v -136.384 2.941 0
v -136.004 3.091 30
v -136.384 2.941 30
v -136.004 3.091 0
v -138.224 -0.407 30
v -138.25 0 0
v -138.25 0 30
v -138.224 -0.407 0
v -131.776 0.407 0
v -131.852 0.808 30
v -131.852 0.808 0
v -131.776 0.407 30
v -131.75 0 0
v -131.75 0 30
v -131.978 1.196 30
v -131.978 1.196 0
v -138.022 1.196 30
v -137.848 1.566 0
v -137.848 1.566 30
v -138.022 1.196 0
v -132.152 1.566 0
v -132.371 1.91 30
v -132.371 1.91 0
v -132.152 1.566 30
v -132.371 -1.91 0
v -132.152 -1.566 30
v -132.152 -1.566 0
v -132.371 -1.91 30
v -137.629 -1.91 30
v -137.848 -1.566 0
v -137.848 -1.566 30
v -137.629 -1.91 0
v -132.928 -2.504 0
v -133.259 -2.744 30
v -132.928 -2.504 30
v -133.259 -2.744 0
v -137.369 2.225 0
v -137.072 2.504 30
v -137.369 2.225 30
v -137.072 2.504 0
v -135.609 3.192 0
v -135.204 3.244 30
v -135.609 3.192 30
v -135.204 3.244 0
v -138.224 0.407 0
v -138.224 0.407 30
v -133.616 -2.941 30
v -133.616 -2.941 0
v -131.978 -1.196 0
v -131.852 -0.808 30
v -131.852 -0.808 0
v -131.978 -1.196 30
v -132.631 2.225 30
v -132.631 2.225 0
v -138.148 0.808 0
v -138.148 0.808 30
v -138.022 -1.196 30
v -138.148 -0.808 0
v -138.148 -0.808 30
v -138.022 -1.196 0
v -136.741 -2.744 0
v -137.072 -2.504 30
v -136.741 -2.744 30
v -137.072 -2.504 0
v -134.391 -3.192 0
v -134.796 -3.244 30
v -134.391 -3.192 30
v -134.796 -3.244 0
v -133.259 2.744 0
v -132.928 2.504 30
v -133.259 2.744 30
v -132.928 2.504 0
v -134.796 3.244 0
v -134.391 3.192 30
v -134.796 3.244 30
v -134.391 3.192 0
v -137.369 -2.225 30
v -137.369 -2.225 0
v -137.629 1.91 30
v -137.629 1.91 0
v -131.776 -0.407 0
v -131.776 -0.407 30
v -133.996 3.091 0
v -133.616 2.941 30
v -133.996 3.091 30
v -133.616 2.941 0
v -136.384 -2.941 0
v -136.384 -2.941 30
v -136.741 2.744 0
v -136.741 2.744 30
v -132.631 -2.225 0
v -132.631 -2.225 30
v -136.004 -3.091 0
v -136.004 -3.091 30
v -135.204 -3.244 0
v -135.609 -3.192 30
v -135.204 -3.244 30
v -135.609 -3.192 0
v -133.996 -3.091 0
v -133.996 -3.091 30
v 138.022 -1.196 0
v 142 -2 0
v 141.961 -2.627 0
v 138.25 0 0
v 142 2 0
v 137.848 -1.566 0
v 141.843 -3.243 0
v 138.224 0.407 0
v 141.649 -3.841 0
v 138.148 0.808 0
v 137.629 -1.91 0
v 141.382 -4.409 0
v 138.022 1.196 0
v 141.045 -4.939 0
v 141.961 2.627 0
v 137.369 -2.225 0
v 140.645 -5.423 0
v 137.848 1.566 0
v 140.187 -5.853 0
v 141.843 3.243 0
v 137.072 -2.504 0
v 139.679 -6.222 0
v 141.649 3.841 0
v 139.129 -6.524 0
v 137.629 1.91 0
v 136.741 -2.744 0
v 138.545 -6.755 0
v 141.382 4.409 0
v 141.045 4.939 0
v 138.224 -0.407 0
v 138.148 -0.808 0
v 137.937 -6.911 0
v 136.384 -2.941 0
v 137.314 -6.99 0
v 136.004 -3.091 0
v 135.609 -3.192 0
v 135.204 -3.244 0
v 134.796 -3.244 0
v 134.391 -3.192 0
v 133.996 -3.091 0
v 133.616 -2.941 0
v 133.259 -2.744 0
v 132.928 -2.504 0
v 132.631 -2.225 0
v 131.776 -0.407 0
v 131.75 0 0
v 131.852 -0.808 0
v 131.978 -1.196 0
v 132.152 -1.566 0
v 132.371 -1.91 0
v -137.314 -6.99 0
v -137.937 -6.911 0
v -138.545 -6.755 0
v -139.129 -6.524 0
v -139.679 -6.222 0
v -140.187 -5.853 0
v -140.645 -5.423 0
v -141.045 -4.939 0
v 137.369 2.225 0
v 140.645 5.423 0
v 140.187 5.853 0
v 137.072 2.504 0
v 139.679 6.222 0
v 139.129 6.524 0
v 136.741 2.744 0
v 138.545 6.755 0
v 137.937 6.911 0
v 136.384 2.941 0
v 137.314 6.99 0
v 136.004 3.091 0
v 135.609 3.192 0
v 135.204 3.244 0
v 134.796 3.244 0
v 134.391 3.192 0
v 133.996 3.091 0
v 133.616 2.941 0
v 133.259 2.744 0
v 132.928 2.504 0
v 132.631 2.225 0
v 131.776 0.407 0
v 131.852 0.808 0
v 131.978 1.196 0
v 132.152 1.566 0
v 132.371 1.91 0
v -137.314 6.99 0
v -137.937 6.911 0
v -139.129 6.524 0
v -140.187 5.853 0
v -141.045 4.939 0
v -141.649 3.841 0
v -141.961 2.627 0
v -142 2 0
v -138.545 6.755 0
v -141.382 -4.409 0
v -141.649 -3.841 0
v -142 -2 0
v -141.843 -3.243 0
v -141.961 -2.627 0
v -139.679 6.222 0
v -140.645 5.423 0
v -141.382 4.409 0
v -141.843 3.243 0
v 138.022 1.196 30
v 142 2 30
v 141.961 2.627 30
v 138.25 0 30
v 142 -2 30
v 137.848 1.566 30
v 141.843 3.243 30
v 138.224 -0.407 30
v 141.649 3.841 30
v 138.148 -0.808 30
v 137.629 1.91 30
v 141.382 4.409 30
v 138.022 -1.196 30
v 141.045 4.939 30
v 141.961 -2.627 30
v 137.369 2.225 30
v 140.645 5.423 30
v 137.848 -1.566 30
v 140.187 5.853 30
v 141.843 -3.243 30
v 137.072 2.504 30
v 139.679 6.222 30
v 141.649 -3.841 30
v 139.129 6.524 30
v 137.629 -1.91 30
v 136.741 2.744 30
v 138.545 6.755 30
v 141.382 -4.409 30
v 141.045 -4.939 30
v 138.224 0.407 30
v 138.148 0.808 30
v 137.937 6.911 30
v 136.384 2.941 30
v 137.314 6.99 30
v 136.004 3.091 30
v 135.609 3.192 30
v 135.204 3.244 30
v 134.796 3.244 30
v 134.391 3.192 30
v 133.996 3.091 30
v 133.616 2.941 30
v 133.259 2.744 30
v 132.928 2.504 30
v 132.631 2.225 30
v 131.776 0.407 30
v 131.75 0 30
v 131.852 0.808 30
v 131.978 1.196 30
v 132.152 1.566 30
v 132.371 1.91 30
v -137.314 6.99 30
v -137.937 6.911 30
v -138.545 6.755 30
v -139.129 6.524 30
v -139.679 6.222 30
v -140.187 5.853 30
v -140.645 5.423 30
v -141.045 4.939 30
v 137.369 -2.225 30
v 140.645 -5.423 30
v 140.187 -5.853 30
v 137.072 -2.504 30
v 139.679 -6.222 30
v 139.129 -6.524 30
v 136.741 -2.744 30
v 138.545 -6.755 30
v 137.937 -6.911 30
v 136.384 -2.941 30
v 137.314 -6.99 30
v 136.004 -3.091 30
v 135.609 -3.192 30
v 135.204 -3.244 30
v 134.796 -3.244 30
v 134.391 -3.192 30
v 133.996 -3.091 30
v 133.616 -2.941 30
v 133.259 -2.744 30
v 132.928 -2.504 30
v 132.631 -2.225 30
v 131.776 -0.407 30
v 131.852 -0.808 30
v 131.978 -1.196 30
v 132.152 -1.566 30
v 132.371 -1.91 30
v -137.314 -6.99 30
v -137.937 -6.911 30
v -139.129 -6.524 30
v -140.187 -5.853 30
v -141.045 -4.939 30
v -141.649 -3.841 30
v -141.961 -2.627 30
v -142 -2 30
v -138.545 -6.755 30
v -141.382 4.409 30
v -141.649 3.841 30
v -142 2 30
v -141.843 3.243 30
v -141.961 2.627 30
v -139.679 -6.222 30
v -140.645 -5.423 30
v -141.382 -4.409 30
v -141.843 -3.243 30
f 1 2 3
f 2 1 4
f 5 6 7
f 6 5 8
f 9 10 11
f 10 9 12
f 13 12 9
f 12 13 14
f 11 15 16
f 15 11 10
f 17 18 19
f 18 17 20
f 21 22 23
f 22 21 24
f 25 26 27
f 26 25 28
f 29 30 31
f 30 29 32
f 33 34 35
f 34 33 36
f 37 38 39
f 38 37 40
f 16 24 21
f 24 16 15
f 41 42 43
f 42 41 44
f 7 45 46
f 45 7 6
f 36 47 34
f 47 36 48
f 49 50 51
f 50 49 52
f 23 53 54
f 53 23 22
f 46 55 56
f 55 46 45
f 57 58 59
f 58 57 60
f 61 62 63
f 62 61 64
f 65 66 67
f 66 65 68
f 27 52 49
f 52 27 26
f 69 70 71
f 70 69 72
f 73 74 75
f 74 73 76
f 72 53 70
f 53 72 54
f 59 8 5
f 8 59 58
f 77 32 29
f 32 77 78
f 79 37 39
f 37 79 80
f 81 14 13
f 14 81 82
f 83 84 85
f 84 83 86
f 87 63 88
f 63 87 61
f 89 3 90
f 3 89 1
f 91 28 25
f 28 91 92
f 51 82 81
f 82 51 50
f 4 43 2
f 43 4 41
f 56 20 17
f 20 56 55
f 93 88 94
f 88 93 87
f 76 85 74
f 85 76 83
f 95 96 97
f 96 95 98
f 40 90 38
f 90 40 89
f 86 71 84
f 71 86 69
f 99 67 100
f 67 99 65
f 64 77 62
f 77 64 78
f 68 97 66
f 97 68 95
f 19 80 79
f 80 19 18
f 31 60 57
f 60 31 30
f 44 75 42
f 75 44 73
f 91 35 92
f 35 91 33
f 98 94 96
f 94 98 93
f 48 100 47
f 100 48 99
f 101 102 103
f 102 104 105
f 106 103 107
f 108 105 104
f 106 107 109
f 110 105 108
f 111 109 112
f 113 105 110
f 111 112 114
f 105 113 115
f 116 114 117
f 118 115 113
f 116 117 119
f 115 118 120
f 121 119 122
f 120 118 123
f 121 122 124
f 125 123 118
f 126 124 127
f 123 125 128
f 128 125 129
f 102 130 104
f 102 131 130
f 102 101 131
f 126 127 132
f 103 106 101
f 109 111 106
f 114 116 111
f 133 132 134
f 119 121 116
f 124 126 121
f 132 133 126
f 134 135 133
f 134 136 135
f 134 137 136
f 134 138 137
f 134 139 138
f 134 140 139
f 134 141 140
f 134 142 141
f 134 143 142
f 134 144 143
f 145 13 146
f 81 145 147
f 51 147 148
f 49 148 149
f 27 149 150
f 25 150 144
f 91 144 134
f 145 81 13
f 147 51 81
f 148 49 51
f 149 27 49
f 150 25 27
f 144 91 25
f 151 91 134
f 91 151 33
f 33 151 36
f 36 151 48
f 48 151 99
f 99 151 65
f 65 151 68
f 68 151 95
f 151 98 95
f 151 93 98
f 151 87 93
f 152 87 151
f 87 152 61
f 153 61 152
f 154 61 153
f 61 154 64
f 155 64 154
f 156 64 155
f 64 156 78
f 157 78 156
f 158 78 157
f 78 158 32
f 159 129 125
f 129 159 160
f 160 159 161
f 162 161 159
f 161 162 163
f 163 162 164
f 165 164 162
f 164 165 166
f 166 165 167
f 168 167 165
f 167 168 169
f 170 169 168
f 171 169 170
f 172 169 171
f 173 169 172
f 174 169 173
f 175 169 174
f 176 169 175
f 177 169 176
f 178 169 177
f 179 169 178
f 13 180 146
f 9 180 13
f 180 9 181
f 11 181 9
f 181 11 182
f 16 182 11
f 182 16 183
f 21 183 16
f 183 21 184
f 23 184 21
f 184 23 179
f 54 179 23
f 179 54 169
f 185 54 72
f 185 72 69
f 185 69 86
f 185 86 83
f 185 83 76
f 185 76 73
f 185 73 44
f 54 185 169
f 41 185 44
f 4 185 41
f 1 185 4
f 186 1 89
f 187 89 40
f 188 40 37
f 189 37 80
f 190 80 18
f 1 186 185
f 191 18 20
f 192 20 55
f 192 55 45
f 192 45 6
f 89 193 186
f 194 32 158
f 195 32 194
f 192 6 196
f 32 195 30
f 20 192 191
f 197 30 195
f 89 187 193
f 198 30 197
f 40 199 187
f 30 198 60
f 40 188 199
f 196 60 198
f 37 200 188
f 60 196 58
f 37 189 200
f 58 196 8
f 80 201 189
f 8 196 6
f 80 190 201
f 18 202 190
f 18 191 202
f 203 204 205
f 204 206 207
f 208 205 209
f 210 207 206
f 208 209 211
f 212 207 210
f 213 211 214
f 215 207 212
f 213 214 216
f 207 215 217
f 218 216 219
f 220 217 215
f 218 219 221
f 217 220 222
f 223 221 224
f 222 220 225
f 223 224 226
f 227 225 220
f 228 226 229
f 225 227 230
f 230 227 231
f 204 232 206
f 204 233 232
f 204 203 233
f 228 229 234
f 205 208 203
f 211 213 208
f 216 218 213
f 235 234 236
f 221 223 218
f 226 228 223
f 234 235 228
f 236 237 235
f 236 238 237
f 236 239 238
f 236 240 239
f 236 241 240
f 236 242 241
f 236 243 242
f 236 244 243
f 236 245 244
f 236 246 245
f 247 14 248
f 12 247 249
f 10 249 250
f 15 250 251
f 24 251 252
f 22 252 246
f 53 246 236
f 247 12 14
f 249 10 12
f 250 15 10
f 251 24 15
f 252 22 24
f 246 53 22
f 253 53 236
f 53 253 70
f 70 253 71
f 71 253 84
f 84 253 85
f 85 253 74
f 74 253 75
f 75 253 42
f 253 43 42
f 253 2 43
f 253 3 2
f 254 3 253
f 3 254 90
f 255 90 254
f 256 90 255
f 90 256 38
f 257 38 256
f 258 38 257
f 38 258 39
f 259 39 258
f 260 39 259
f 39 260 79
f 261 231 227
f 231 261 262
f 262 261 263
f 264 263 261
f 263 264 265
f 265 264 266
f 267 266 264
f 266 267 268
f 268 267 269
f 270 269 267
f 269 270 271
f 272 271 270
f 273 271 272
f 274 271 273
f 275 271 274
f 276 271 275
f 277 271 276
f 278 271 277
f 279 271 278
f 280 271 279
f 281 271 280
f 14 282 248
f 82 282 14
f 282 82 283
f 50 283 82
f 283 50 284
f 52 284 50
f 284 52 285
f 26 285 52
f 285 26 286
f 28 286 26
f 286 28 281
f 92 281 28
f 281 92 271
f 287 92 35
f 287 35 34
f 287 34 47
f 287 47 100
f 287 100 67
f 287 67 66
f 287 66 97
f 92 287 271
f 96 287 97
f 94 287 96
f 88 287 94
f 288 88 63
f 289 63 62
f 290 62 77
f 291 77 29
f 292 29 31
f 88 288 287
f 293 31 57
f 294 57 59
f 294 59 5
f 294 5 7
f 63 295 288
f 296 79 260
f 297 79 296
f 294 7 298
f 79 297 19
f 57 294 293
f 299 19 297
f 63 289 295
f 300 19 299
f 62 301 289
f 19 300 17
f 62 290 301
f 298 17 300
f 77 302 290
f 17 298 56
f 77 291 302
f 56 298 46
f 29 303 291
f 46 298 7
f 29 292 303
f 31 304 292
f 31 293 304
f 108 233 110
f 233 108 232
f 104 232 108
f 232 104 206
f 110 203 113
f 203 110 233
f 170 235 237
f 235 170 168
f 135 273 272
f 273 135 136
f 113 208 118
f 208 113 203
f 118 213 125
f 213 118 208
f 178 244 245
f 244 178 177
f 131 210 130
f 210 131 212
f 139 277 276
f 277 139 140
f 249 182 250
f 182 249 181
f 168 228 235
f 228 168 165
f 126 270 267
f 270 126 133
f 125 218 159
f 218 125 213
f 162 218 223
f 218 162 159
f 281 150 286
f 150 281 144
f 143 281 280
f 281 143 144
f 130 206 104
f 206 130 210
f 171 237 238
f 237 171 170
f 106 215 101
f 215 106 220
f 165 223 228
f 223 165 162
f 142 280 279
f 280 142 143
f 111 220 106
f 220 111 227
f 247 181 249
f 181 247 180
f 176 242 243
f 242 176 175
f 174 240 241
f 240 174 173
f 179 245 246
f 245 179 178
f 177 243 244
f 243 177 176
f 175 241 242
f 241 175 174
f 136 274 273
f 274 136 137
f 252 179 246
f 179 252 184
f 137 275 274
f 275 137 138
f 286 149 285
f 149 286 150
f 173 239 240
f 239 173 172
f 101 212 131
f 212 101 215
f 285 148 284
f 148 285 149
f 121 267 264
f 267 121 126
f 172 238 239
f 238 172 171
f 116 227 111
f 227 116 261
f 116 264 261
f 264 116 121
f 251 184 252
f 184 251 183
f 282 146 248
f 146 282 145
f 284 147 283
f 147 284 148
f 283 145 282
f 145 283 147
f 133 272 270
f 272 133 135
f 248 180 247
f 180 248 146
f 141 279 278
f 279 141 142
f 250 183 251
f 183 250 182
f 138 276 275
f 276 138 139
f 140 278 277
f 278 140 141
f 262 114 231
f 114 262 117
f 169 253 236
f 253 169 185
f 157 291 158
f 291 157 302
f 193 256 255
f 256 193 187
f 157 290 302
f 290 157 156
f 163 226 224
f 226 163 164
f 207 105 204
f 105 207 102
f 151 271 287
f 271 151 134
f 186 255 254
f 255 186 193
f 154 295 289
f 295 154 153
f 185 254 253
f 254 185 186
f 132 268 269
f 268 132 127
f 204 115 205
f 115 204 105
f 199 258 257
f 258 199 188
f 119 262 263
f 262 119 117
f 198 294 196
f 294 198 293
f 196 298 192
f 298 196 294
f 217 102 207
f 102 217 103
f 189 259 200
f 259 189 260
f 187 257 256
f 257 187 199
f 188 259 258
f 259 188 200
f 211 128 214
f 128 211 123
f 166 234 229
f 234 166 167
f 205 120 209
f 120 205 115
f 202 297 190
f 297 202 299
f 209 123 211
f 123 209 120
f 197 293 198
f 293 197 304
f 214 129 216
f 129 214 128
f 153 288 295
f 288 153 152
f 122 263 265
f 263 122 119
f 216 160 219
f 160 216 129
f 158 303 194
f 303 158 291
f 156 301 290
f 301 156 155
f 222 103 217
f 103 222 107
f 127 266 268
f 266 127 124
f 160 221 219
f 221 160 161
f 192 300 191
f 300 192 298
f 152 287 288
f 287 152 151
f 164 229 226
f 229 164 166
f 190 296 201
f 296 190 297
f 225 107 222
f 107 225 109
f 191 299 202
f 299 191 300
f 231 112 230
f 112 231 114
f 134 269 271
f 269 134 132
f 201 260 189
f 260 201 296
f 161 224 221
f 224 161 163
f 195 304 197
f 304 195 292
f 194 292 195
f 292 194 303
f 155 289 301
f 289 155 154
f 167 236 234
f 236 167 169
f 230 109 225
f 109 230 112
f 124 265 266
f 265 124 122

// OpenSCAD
$fn = 50;


difference() {
	union() {
		hull() {
			translate(v = [-137.0000000000, 2.0000000000, 0]) {
				cylinder(h = 30, r = 5);
			}
			translate(v = [137.0000000000, 2.0000000000, 0]) {
				cylinder(h = 30, r = 5);
			}
			translate(v = [-137.0000000000, -2.0000000000, 0]) {
				cylinder(h = 30, r = 5);
			}
			translate(v = [137.0000000000, -2.0000000000, 0]) {
				cylinder(h = 30, r = 5);
			}
		}
	}
	union() {
		translate(v = [-135.0000000000, 0.0000000000, 0]) {
			cylinder(h = 30, r = 3.2500000000);
		}
		translate(v = [135.0000000000, 0.0000000000, 0]) {
			cylinder(h = 30, r = 3.2500000000);
		}
		translate(v = [-135.0000000000, 0.0000000000, 0]) {
			cylinder(h = 30, r = 1.8000000000);
		}
		translate(v = [135.0000000000, 0.0000000000, 0]) {
			cylinder(h = 30, r = 1.8000000000);
		}
		translate(v = [-135.0000000000, 0.0000000000, 0]) {
			cylinder(h = 30, r = 1.8000000000);
		}
		translate(v = [135.0000000000, 0.0000000000, 0]) {
			cylinder(h = 30, r = 1.8000000000);
		}
		translate(v = [-135.0000000000, 0.0000000000, 0]) {
			cylinder(h = 30, r = 1.8000000000);
		}
		translate(v = [135.0000000000, 0.0000000000, 0]) {
			cylinder(h = 30, r = 1.8000000000);
		}
	}
}
